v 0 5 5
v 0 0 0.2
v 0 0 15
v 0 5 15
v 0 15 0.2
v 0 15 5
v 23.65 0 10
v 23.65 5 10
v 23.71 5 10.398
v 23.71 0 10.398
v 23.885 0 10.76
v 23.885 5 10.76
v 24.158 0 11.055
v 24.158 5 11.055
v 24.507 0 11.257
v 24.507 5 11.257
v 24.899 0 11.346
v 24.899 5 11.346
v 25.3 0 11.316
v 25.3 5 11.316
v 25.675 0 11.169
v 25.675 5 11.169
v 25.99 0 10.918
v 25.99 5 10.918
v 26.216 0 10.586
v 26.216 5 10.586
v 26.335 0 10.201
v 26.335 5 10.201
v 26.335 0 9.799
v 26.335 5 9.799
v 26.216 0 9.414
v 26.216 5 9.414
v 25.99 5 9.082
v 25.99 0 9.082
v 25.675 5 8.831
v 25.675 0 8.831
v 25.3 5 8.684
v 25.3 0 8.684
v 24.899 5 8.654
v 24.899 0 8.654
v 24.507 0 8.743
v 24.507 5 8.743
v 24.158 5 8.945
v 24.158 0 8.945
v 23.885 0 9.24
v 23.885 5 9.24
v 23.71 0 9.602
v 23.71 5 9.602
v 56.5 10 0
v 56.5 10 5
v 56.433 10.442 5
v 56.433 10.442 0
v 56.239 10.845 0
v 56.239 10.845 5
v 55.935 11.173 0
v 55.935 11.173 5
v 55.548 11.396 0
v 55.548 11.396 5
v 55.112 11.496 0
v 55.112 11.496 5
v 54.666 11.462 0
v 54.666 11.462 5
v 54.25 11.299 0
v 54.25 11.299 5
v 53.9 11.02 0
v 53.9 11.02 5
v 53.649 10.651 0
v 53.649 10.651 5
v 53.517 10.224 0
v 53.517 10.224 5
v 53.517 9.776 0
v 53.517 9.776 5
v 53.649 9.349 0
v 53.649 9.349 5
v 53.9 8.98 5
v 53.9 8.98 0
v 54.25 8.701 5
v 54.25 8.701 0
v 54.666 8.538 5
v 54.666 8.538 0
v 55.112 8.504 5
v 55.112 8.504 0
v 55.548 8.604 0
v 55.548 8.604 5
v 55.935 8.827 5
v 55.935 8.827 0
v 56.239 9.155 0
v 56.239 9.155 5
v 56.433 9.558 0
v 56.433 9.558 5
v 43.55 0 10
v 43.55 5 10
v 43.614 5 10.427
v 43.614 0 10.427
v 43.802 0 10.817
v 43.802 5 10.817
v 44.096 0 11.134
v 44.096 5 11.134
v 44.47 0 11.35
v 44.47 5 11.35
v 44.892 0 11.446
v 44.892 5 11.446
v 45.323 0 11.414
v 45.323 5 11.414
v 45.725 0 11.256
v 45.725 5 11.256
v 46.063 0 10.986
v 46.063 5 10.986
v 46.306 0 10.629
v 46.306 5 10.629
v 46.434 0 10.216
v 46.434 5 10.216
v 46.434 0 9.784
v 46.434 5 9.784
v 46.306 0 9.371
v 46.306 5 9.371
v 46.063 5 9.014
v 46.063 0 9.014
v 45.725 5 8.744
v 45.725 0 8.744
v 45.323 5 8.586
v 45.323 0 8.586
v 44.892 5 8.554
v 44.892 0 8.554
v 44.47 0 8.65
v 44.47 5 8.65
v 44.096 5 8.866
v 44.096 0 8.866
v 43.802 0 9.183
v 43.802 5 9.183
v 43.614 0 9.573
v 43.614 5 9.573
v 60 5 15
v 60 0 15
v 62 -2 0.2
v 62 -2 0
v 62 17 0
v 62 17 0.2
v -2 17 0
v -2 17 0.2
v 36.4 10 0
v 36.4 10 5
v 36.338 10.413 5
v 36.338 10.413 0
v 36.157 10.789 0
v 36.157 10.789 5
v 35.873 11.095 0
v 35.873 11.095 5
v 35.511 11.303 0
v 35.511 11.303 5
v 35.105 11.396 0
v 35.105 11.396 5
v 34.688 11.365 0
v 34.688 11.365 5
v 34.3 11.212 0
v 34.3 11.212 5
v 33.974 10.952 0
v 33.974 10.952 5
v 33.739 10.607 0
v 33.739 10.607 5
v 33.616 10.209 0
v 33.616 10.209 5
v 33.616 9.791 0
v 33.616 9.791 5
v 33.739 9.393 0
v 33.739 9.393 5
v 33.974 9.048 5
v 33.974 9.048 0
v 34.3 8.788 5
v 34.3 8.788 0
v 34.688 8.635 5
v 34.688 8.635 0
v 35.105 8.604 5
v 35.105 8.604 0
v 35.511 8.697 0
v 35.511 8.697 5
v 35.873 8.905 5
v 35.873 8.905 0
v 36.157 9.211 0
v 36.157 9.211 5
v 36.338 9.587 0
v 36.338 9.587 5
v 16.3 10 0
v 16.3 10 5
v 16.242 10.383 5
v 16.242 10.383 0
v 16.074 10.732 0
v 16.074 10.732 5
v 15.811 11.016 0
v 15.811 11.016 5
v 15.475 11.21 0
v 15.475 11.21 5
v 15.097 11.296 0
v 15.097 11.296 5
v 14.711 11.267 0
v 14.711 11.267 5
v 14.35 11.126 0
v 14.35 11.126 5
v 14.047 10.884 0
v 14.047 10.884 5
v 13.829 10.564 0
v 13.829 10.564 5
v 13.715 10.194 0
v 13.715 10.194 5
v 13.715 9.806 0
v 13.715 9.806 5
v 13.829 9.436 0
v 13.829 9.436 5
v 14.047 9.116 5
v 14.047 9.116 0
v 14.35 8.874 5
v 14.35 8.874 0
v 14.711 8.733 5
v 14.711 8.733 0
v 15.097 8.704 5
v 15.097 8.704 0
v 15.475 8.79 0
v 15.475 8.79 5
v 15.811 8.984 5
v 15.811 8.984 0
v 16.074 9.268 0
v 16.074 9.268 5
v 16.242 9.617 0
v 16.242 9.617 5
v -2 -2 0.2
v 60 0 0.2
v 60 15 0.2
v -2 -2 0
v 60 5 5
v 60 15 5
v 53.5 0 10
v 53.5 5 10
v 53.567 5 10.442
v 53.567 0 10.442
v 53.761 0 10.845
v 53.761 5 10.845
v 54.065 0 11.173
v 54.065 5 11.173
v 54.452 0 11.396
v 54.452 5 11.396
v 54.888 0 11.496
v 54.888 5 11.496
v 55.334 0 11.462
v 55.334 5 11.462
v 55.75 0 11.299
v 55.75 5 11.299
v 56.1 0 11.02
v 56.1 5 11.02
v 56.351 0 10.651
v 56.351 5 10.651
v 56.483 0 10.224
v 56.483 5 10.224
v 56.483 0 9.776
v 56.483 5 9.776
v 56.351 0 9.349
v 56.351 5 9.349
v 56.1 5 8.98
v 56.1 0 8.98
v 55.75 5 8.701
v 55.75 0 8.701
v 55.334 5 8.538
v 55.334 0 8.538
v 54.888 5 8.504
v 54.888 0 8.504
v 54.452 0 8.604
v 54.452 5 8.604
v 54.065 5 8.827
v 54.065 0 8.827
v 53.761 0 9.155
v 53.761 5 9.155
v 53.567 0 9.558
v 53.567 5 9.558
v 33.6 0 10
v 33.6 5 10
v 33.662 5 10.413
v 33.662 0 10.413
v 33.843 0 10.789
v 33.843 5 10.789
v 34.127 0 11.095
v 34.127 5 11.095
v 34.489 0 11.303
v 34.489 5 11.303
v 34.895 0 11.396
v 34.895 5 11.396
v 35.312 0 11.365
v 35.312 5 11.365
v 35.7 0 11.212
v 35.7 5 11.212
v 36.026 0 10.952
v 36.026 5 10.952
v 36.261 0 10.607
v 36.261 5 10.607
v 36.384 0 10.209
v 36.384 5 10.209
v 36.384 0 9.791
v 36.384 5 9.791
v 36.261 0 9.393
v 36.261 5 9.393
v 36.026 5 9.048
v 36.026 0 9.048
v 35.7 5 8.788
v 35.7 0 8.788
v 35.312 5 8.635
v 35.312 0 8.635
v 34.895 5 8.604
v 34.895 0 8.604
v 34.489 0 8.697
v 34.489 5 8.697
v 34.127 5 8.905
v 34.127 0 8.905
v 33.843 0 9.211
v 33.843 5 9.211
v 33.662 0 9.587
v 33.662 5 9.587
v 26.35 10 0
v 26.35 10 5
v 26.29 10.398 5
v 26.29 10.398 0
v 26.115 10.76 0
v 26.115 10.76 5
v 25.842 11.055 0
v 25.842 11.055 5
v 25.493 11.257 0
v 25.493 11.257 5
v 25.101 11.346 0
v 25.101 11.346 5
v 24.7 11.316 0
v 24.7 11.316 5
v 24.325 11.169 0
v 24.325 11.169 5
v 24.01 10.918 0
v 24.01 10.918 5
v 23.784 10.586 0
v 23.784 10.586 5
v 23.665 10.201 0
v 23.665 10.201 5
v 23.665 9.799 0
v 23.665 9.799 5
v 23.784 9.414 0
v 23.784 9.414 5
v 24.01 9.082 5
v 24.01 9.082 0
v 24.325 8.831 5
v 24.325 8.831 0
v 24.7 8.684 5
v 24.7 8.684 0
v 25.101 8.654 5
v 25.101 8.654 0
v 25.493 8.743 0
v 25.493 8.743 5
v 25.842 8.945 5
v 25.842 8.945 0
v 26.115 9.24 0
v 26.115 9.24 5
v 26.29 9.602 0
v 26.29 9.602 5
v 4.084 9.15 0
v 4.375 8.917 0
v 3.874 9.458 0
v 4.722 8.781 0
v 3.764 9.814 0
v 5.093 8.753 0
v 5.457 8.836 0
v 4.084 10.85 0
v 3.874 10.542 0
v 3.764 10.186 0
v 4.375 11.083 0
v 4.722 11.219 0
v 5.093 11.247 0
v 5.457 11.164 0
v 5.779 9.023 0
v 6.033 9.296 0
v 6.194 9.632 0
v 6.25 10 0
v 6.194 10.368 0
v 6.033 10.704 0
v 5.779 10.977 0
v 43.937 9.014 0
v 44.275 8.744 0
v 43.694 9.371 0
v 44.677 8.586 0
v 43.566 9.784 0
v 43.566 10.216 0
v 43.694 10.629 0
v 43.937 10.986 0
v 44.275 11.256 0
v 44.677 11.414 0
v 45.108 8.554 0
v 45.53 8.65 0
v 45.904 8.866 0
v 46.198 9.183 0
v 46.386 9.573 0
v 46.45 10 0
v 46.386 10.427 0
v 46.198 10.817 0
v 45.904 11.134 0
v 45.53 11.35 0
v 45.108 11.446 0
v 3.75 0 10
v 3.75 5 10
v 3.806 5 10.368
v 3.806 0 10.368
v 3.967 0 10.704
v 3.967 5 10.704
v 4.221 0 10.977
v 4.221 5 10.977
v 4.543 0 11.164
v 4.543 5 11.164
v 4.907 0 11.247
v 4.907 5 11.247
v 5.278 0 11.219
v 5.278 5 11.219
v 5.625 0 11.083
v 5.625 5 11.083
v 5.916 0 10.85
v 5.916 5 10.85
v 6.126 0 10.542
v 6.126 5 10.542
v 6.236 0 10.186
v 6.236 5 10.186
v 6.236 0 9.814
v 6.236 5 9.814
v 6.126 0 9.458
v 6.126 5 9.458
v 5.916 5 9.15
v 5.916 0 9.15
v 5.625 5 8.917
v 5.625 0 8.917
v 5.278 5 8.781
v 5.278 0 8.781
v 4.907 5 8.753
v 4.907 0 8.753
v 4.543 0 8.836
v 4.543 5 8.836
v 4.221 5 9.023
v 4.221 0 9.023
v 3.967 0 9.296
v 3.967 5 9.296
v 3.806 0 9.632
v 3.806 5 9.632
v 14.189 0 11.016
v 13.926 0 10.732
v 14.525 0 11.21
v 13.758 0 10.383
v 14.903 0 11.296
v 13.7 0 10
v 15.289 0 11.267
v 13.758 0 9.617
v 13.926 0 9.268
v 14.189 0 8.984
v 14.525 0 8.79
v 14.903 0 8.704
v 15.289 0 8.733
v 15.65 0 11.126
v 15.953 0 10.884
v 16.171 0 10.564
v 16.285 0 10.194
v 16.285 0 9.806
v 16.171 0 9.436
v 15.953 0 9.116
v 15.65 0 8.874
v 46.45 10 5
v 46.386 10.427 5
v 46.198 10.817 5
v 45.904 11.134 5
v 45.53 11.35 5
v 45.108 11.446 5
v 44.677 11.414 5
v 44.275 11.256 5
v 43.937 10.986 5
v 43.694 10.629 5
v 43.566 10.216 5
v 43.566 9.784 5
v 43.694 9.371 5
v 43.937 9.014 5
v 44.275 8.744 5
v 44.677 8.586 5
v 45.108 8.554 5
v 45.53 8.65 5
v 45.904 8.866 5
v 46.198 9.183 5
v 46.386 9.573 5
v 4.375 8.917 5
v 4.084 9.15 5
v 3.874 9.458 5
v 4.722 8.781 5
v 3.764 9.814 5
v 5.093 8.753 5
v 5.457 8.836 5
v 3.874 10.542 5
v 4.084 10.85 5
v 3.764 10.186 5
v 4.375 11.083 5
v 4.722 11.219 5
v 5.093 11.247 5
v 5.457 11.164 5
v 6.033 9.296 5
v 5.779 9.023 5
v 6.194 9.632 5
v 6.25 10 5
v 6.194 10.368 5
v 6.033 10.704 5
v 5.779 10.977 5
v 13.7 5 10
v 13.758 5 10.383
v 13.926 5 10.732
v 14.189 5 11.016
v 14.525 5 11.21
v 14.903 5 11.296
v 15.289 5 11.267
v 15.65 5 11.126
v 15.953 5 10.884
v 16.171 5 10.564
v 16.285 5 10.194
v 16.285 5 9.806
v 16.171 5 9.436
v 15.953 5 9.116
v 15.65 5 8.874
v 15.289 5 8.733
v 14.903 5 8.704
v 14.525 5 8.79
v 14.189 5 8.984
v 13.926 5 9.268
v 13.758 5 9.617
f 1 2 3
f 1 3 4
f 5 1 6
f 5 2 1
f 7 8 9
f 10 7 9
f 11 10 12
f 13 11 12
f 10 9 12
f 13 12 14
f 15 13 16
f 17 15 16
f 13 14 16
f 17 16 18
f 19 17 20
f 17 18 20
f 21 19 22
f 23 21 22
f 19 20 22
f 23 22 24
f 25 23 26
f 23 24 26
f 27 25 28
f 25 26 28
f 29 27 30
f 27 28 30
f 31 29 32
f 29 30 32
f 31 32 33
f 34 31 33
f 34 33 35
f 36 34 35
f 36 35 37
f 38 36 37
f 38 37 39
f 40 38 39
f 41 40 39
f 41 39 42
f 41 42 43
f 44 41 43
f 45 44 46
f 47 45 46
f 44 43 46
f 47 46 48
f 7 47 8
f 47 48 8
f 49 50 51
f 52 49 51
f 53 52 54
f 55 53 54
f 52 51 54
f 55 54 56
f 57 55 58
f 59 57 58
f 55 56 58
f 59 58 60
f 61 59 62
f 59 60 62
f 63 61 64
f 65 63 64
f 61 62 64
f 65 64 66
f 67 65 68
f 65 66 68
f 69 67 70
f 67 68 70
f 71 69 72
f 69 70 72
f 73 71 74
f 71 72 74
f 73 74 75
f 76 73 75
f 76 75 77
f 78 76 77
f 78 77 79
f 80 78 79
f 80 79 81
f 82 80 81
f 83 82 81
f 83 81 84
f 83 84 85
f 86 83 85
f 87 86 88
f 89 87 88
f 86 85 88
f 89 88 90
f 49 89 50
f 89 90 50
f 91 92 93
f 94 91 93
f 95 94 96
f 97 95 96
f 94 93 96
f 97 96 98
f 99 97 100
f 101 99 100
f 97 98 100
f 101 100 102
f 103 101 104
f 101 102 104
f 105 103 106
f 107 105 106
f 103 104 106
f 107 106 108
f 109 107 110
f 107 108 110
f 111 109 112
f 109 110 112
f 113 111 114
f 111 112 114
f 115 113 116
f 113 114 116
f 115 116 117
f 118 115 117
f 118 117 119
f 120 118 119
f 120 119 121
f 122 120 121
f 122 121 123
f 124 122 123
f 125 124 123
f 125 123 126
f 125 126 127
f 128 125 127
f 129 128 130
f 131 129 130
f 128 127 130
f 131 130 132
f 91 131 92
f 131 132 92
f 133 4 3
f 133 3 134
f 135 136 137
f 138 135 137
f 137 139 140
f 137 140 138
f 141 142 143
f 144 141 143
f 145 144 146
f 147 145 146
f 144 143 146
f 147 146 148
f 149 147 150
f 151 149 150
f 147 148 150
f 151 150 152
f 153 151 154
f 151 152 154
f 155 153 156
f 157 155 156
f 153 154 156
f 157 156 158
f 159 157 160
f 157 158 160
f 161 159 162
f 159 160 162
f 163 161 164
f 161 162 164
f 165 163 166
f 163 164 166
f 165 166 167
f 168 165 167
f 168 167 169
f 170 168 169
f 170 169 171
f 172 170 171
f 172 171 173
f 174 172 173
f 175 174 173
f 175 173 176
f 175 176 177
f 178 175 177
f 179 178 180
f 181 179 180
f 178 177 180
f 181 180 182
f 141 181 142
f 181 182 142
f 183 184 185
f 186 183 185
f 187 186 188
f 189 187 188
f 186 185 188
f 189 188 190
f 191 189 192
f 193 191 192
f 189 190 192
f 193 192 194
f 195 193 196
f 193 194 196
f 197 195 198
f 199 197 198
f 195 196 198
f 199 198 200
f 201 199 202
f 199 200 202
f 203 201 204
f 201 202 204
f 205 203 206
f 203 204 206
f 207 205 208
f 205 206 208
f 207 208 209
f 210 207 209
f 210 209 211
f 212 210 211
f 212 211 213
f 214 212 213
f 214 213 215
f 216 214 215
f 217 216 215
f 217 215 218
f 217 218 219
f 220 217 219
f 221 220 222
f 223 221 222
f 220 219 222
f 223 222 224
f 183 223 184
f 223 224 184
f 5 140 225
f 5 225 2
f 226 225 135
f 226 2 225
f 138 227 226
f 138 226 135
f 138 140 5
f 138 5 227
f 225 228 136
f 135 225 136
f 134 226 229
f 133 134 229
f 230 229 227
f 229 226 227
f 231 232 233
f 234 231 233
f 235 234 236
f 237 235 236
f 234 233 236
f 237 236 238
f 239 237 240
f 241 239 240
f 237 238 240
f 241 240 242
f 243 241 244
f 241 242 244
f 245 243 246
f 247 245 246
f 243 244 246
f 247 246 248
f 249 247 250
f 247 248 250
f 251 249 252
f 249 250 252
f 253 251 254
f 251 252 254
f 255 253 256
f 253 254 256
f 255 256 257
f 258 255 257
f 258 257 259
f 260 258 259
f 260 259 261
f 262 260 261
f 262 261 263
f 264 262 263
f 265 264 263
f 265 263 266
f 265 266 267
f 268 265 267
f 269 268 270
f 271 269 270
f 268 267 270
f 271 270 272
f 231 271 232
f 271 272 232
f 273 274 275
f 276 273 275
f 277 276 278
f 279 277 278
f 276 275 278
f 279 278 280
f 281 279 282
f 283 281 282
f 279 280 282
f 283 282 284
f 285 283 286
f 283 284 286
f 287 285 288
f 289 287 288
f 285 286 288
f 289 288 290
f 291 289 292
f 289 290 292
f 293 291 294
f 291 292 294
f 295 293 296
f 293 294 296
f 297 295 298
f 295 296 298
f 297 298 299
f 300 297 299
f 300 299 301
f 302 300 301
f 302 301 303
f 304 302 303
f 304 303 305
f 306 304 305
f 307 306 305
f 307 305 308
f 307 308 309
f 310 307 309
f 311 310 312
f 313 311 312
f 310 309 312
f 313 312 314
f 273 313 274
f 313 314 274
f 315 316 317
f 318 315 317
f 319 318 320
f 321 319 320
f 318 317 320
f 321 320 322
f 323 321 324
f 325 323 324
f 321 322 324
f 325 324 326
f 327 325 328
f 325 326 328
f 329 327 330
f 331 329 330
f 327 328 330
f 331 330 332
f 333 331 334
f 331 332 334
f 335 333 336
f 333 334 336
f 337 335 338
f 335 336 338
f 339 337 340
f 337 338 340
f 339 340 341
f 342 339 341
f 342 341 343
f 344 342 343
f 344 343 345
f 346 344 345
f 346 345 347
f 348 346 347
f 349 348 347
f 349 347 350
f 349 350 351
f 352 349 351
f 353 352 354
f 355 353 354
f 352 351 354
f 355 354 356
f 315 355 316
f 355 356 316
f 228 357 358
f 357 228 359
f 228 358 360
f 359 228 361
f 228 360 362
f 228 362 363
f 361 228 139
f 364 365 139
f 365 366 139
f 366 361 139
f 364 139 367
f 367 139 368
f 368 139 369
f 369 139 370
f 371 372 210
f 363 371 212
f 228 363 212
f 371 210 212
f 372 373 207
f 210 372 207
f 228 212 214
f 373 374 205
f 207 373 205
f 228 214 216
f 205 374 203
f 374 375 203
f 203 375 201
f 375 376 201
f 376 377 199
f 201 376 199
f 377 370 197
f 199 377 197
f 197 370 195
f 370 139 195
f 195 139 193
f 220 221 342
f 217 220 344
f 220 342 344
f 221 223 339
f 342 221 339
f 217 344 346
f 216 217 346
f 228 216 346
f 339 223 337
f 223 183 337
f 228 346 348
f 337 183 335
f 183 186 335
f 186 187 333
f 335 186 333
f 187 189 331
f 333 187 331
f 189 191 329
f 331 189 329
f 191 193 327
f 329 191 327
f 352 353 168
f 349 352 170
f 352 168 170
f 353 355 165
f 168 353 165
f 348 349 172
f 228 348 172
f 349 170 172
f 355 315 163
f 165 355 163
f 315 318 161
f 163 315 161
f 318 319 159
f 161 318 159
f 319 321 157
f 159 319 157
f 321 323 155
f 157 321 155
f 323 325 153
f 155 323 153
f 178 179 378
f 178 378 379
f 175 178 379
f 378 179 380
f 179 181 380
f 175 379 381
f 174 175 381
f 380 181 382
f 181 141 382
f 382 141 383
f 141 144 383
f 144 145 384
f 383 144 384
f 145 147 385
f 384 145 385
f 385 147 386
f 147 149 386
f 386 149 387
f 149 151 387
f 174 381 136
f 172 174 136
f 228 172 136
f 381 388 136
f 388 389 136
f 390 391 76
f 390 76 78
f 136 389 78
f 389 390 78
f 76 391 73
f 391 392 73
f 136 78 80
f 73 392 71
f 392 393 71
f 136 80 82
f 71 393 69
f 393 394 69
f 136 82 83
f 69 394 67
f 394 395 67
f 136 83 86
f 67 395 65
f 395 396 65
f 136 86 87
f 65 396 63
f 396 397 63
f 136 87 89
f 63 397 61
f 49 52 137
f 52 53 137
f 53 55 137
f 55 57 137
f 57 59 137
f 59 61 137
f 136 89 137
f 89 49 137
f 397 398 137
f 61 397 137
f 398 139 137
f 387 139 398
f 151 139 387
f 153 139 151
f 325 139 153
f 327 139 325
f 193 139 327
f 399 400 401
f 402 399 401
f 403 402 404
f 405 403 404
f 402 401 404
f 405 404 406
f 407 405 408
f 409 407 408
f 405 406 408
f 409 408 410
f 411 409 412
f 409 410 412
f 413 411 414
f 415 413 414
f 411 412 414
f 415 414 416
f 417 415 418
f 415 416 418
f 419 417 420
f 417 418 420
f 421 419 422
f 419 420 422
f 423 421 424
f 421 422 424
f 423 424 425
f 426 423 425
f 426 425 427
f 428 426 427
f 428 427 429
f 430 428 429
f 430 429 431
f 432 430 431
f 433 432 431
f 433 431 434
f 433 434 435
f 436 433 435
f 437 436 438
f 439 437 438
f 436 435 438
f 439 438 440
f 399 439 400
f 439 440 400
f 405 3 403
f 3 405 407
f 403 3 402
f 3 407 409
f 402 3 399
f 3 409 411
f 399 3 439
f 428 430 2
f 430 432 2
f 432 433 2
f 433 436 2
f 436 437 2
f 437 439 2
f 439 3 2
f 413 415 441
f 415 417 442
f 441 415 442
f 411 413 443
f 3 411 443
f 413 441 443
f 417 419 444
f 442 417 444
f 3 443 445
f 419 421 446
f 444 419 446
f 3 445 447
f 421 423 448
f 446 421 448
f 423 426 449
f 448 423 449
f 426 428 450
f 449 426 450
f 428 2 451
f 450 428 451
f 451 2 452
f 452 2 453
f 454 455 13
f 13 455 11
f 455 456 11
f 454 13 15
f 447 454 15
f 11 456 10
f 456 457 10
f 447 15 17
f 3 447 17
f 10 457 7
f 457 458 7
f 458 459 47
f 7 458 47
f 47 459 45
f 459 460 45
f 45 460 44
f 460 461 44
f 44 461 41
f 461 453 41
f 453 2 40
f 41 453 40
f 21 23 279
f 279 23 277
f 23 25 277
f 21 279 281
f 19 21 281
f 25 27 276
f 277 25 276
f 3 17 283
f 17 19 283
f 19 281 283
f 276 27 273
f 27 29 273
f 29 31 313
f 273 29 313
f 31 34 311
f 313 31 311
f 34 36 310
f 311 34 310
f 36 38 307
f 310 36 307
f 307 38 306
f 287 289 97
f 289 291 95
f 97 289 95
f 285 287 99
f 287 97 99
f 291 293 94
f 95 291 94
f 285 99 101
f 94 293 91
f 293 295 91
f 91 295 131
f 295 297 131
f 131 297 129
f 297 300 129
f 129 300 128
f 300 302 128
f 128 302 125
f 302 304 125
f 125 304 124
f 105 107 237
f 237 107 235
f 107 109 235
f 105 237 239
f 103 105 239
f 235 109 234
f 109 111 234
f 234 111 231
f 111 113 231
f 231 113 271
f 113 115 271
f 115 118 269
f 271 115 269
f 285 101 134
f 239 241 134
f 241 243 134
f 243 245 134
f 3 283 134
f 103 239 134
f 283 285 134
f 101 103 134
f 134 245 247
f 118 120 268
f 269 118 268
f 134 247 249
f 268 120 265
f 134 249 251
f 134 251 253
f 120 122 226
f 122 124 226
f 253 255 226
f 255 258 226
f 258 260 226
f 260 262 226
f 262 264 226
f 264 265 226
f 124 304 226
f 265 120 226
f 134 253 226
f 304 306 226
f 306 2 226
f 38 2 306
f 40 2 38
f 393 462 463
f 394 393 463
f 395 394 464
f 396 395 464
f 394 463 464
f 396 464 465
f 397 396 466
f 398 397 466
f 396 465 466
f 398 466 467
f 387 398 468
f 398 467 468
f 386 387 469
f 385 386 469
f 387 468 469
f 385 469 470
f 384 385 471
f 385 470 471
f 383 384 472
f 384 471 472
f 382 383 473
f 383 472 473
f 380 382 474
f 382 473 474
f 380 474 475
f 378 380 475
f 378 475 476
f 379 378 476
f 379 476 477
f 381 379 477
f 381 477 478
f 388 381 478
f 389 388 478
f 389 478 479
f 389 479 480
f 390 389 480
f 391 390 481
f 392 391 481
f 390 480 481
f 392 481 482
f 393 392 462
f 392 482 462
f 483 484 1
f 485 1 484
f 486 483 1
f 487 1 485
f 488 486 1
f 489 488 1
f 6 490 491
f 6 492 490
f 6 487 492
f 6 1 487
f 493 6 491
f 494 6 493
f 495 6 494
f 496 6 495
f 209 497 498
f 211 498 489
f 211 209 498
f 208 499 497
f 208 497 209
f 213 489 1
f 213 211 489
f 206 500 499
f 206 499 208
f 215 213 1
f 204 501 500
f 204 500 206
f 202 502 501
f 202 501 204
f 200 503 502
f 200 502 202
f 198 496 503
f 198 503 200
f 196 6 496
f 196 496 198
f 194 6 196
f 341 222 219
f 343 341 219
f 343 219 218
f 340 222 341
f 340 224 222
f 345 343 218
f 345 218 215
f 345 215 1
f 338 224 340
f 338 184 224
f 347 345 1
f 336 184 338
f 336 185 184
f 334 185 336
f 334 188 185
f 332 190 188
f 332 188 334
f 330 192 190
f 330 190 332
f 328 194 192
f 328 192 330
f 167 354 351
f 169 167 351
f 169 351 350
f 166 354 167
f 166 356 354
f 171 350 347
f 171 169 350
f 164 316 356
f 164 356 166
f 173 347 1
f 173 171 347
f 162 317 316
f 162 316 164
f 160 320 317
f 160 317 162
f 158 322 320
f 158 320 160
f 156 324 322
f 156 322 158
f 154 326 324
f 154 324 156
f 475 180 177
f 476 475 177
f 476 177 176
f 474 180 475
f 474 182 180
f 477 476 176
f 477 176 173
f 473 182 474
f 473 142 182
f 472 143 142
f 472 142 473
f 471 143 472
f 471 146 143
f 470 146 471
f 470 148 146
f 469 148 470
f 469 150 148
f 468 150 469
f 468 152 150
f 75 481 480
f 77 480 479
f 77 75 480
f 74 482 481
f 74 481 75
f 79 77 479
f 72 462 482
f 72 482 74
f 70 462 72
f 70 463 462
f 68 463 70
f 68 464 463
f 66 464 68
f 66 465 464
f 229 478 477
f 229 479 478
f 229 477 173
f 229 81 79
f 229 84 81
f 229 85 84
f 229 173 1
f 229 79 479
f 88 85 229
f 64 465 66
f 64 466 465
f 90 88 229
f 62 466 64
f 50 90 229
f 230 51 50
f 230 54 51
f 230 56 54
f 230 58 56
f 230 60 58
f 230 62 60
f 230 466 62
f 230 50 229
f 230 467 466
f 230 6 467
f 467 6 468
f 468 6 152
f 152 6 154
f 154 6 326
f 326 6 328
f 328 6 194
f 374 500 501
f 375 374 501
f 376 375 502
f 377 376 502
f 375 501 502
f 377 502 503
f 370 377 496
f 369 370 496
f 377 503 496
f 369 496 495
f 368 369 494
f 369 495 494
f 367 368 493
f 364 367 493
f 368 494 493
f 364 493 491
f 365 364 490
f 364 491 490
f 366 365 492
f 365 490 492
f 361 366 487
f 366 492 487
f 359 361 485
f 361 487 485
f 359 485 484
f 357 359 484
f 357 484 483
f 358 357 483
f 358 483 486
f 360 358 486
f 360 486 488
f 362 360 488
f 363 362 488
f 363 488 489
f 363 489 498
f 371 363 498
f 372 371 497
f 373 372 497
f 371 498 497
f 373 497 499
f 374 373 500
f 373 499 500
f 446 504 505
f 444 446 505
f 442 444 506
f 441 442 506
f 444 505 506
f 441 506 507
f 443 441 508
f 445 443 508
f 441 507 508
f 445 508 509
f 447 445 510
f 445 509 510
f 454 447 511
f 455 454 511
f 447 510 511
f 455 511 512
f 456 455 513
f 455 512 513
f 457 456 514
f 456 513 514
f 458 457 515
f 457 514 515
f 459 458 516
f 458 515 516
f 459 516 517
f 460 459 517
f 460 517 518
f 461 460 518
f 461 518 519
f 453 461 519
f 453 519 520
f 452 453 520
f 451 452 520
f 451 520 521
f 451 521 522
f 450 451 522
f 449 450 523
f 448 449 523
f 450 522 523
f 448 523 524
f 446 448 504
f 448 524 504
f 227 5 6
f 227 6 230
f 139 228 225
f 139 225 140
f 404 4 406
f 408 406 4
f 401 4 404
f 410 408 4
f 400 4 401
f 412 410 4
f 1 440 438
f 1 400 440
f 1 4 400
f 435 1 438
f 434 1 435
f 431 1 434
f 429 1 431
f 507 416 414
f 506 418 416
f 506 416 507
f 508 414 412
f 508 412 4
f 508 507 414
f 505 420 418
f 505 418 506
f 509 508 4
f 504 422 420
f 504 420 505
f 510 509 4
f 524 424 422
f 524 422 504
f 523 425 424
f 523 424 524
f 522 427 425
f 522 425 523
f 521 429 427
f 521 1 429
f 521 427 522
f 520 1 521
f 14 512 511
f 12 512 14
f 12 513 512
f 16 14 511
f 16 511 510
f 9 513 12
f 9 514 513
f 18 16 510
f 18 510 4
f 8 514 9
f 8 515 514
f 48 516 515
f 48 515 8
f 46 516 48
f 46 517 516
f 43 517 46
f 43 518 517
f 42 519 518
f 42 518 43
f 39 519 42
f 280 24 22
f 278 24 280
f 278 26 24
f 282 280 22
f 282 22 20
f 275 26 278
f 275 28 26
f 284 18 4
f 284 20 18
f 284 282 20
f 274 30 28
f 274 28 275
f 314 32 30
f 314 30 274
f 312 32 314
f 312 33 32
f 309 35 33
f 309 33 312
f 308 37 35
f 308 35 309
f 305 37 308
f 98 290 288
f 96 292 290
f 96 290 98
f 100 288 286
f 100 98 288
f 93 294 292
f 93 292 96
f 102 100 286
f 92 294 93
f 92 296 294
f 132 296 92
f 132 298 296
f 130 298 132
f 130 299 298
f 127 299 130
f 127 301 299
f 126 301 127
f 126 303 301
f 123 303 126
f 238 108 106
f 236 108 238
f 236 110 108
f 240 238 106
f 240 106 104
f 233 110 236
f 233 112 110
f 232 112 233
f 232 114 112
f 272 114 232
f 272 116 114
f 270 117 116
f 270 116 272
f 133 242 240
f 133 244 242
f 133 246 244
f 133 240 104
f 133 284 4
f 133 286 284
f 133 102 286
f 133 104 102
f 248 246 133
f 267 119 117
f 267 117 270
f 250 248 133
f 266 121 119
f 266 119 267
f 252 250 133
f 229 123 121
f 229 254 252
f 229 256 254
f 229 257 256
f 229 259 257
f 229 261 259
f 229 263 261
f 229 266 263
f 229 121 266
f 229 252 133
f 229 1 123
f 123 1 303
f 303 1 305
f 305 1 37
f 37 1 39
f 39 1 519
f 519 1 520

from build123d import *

# Parameters (mm, degrees)
F0_W     = 60
F0_H     = 15
F1_DEPTH = 5
F2_W     = 60
F2_H     = 5
F3_DEPTH = 10
F4_R     = 1.25
F4_R_2   = 1.3
F4_R_3   = 1.35
F4_R_4   = 1.4
F4_R_5   = 1.45
F4_R_6   = 1.5
F5_DEPTH = 5
F6_R     = 1.5
F6_R_2   = 1.45
F6_R_3   = 1.4
F6_R_4   = 1.35
F6_R_5   = 1.3
F6_R_6   = 1.25
F7_DEPTH = 5
F8_W     = 64
F8_H     = 19
F8_W_2   = 60
F8_H_2   = 15
F9_DEPTH = 0.2


with BuildPart() as f1:
    # F0 (on Top) → F1 (new body)
    with BuildSketch(Plane.XY):
        with Locations((30, 7.5)):
            Rectangle(F0_W, F0_H)
    extrude(amount=F1_DEPTH)

    # F2 (on face) → F3 (join)
    with BuildSketch(Plane.XY.offset(5)):
        with Locations((30, 2.5)):
            Rectangle(F2_W, F2_H)
    extrude(amount=F3_DEPTH)

    # F4 (on face) → F5 (cut, through all)
    with BuildSketch(Plane.XY.offset(5)):
        with Locations((5, 10)):
            Circle(F4_R)
        with Locations((15, 10)):
            Circle(F4_R_2)
        with Locations((25, 10)):
            Circle(F4_R_3)
        with Locations((35, 10)):
            Circle(F4_R_4)
        with Locations((45, 10)):
            Circle(F4_R_5)
        with Locations((55, 10)):
            Circle(F4_R_6)
    extrude(amount=-F5_DEPTH, mode=Mode.SUBTRACT)

    # F6 (on face) → F7 (cut, through all)
    with BuildSketch(Plane(origin=(0, 5, 0), x_dir=(-1, 0, 0), z_dir=(0, 1, 0))):
        with Locations((-55, 10)):
            Circle(F6_R)
        with Locations((-45, 10)):
            Circle(F6_R_2)
        with Locations((-35, 10)):
            Circle(F6_R_3)
        with Locations((-25, 10)):
            Circle(F6_R_4)
        with Locations((-15, 10)):
            Circle(F6_R_5)
        with Locations((-5, 10)):
            Circle(F6_R_6)
    extrude(amount=-F7_DEPTH, mode=Mode.SUBTRACT)

    # F8 (on Top) → F9 (join)
    with BuildSketch(Plane.XY):
        with Locations((30, 7.5)):
            Rectangle(F8_W, F8_H)
        with Locations((30, 7.5)):
            Rectangle(F8_W_2, F8_H_2, mode=Mode.SUBTRACT)
    extrude(amount=F9_DEPTH)


solid = f1.part
